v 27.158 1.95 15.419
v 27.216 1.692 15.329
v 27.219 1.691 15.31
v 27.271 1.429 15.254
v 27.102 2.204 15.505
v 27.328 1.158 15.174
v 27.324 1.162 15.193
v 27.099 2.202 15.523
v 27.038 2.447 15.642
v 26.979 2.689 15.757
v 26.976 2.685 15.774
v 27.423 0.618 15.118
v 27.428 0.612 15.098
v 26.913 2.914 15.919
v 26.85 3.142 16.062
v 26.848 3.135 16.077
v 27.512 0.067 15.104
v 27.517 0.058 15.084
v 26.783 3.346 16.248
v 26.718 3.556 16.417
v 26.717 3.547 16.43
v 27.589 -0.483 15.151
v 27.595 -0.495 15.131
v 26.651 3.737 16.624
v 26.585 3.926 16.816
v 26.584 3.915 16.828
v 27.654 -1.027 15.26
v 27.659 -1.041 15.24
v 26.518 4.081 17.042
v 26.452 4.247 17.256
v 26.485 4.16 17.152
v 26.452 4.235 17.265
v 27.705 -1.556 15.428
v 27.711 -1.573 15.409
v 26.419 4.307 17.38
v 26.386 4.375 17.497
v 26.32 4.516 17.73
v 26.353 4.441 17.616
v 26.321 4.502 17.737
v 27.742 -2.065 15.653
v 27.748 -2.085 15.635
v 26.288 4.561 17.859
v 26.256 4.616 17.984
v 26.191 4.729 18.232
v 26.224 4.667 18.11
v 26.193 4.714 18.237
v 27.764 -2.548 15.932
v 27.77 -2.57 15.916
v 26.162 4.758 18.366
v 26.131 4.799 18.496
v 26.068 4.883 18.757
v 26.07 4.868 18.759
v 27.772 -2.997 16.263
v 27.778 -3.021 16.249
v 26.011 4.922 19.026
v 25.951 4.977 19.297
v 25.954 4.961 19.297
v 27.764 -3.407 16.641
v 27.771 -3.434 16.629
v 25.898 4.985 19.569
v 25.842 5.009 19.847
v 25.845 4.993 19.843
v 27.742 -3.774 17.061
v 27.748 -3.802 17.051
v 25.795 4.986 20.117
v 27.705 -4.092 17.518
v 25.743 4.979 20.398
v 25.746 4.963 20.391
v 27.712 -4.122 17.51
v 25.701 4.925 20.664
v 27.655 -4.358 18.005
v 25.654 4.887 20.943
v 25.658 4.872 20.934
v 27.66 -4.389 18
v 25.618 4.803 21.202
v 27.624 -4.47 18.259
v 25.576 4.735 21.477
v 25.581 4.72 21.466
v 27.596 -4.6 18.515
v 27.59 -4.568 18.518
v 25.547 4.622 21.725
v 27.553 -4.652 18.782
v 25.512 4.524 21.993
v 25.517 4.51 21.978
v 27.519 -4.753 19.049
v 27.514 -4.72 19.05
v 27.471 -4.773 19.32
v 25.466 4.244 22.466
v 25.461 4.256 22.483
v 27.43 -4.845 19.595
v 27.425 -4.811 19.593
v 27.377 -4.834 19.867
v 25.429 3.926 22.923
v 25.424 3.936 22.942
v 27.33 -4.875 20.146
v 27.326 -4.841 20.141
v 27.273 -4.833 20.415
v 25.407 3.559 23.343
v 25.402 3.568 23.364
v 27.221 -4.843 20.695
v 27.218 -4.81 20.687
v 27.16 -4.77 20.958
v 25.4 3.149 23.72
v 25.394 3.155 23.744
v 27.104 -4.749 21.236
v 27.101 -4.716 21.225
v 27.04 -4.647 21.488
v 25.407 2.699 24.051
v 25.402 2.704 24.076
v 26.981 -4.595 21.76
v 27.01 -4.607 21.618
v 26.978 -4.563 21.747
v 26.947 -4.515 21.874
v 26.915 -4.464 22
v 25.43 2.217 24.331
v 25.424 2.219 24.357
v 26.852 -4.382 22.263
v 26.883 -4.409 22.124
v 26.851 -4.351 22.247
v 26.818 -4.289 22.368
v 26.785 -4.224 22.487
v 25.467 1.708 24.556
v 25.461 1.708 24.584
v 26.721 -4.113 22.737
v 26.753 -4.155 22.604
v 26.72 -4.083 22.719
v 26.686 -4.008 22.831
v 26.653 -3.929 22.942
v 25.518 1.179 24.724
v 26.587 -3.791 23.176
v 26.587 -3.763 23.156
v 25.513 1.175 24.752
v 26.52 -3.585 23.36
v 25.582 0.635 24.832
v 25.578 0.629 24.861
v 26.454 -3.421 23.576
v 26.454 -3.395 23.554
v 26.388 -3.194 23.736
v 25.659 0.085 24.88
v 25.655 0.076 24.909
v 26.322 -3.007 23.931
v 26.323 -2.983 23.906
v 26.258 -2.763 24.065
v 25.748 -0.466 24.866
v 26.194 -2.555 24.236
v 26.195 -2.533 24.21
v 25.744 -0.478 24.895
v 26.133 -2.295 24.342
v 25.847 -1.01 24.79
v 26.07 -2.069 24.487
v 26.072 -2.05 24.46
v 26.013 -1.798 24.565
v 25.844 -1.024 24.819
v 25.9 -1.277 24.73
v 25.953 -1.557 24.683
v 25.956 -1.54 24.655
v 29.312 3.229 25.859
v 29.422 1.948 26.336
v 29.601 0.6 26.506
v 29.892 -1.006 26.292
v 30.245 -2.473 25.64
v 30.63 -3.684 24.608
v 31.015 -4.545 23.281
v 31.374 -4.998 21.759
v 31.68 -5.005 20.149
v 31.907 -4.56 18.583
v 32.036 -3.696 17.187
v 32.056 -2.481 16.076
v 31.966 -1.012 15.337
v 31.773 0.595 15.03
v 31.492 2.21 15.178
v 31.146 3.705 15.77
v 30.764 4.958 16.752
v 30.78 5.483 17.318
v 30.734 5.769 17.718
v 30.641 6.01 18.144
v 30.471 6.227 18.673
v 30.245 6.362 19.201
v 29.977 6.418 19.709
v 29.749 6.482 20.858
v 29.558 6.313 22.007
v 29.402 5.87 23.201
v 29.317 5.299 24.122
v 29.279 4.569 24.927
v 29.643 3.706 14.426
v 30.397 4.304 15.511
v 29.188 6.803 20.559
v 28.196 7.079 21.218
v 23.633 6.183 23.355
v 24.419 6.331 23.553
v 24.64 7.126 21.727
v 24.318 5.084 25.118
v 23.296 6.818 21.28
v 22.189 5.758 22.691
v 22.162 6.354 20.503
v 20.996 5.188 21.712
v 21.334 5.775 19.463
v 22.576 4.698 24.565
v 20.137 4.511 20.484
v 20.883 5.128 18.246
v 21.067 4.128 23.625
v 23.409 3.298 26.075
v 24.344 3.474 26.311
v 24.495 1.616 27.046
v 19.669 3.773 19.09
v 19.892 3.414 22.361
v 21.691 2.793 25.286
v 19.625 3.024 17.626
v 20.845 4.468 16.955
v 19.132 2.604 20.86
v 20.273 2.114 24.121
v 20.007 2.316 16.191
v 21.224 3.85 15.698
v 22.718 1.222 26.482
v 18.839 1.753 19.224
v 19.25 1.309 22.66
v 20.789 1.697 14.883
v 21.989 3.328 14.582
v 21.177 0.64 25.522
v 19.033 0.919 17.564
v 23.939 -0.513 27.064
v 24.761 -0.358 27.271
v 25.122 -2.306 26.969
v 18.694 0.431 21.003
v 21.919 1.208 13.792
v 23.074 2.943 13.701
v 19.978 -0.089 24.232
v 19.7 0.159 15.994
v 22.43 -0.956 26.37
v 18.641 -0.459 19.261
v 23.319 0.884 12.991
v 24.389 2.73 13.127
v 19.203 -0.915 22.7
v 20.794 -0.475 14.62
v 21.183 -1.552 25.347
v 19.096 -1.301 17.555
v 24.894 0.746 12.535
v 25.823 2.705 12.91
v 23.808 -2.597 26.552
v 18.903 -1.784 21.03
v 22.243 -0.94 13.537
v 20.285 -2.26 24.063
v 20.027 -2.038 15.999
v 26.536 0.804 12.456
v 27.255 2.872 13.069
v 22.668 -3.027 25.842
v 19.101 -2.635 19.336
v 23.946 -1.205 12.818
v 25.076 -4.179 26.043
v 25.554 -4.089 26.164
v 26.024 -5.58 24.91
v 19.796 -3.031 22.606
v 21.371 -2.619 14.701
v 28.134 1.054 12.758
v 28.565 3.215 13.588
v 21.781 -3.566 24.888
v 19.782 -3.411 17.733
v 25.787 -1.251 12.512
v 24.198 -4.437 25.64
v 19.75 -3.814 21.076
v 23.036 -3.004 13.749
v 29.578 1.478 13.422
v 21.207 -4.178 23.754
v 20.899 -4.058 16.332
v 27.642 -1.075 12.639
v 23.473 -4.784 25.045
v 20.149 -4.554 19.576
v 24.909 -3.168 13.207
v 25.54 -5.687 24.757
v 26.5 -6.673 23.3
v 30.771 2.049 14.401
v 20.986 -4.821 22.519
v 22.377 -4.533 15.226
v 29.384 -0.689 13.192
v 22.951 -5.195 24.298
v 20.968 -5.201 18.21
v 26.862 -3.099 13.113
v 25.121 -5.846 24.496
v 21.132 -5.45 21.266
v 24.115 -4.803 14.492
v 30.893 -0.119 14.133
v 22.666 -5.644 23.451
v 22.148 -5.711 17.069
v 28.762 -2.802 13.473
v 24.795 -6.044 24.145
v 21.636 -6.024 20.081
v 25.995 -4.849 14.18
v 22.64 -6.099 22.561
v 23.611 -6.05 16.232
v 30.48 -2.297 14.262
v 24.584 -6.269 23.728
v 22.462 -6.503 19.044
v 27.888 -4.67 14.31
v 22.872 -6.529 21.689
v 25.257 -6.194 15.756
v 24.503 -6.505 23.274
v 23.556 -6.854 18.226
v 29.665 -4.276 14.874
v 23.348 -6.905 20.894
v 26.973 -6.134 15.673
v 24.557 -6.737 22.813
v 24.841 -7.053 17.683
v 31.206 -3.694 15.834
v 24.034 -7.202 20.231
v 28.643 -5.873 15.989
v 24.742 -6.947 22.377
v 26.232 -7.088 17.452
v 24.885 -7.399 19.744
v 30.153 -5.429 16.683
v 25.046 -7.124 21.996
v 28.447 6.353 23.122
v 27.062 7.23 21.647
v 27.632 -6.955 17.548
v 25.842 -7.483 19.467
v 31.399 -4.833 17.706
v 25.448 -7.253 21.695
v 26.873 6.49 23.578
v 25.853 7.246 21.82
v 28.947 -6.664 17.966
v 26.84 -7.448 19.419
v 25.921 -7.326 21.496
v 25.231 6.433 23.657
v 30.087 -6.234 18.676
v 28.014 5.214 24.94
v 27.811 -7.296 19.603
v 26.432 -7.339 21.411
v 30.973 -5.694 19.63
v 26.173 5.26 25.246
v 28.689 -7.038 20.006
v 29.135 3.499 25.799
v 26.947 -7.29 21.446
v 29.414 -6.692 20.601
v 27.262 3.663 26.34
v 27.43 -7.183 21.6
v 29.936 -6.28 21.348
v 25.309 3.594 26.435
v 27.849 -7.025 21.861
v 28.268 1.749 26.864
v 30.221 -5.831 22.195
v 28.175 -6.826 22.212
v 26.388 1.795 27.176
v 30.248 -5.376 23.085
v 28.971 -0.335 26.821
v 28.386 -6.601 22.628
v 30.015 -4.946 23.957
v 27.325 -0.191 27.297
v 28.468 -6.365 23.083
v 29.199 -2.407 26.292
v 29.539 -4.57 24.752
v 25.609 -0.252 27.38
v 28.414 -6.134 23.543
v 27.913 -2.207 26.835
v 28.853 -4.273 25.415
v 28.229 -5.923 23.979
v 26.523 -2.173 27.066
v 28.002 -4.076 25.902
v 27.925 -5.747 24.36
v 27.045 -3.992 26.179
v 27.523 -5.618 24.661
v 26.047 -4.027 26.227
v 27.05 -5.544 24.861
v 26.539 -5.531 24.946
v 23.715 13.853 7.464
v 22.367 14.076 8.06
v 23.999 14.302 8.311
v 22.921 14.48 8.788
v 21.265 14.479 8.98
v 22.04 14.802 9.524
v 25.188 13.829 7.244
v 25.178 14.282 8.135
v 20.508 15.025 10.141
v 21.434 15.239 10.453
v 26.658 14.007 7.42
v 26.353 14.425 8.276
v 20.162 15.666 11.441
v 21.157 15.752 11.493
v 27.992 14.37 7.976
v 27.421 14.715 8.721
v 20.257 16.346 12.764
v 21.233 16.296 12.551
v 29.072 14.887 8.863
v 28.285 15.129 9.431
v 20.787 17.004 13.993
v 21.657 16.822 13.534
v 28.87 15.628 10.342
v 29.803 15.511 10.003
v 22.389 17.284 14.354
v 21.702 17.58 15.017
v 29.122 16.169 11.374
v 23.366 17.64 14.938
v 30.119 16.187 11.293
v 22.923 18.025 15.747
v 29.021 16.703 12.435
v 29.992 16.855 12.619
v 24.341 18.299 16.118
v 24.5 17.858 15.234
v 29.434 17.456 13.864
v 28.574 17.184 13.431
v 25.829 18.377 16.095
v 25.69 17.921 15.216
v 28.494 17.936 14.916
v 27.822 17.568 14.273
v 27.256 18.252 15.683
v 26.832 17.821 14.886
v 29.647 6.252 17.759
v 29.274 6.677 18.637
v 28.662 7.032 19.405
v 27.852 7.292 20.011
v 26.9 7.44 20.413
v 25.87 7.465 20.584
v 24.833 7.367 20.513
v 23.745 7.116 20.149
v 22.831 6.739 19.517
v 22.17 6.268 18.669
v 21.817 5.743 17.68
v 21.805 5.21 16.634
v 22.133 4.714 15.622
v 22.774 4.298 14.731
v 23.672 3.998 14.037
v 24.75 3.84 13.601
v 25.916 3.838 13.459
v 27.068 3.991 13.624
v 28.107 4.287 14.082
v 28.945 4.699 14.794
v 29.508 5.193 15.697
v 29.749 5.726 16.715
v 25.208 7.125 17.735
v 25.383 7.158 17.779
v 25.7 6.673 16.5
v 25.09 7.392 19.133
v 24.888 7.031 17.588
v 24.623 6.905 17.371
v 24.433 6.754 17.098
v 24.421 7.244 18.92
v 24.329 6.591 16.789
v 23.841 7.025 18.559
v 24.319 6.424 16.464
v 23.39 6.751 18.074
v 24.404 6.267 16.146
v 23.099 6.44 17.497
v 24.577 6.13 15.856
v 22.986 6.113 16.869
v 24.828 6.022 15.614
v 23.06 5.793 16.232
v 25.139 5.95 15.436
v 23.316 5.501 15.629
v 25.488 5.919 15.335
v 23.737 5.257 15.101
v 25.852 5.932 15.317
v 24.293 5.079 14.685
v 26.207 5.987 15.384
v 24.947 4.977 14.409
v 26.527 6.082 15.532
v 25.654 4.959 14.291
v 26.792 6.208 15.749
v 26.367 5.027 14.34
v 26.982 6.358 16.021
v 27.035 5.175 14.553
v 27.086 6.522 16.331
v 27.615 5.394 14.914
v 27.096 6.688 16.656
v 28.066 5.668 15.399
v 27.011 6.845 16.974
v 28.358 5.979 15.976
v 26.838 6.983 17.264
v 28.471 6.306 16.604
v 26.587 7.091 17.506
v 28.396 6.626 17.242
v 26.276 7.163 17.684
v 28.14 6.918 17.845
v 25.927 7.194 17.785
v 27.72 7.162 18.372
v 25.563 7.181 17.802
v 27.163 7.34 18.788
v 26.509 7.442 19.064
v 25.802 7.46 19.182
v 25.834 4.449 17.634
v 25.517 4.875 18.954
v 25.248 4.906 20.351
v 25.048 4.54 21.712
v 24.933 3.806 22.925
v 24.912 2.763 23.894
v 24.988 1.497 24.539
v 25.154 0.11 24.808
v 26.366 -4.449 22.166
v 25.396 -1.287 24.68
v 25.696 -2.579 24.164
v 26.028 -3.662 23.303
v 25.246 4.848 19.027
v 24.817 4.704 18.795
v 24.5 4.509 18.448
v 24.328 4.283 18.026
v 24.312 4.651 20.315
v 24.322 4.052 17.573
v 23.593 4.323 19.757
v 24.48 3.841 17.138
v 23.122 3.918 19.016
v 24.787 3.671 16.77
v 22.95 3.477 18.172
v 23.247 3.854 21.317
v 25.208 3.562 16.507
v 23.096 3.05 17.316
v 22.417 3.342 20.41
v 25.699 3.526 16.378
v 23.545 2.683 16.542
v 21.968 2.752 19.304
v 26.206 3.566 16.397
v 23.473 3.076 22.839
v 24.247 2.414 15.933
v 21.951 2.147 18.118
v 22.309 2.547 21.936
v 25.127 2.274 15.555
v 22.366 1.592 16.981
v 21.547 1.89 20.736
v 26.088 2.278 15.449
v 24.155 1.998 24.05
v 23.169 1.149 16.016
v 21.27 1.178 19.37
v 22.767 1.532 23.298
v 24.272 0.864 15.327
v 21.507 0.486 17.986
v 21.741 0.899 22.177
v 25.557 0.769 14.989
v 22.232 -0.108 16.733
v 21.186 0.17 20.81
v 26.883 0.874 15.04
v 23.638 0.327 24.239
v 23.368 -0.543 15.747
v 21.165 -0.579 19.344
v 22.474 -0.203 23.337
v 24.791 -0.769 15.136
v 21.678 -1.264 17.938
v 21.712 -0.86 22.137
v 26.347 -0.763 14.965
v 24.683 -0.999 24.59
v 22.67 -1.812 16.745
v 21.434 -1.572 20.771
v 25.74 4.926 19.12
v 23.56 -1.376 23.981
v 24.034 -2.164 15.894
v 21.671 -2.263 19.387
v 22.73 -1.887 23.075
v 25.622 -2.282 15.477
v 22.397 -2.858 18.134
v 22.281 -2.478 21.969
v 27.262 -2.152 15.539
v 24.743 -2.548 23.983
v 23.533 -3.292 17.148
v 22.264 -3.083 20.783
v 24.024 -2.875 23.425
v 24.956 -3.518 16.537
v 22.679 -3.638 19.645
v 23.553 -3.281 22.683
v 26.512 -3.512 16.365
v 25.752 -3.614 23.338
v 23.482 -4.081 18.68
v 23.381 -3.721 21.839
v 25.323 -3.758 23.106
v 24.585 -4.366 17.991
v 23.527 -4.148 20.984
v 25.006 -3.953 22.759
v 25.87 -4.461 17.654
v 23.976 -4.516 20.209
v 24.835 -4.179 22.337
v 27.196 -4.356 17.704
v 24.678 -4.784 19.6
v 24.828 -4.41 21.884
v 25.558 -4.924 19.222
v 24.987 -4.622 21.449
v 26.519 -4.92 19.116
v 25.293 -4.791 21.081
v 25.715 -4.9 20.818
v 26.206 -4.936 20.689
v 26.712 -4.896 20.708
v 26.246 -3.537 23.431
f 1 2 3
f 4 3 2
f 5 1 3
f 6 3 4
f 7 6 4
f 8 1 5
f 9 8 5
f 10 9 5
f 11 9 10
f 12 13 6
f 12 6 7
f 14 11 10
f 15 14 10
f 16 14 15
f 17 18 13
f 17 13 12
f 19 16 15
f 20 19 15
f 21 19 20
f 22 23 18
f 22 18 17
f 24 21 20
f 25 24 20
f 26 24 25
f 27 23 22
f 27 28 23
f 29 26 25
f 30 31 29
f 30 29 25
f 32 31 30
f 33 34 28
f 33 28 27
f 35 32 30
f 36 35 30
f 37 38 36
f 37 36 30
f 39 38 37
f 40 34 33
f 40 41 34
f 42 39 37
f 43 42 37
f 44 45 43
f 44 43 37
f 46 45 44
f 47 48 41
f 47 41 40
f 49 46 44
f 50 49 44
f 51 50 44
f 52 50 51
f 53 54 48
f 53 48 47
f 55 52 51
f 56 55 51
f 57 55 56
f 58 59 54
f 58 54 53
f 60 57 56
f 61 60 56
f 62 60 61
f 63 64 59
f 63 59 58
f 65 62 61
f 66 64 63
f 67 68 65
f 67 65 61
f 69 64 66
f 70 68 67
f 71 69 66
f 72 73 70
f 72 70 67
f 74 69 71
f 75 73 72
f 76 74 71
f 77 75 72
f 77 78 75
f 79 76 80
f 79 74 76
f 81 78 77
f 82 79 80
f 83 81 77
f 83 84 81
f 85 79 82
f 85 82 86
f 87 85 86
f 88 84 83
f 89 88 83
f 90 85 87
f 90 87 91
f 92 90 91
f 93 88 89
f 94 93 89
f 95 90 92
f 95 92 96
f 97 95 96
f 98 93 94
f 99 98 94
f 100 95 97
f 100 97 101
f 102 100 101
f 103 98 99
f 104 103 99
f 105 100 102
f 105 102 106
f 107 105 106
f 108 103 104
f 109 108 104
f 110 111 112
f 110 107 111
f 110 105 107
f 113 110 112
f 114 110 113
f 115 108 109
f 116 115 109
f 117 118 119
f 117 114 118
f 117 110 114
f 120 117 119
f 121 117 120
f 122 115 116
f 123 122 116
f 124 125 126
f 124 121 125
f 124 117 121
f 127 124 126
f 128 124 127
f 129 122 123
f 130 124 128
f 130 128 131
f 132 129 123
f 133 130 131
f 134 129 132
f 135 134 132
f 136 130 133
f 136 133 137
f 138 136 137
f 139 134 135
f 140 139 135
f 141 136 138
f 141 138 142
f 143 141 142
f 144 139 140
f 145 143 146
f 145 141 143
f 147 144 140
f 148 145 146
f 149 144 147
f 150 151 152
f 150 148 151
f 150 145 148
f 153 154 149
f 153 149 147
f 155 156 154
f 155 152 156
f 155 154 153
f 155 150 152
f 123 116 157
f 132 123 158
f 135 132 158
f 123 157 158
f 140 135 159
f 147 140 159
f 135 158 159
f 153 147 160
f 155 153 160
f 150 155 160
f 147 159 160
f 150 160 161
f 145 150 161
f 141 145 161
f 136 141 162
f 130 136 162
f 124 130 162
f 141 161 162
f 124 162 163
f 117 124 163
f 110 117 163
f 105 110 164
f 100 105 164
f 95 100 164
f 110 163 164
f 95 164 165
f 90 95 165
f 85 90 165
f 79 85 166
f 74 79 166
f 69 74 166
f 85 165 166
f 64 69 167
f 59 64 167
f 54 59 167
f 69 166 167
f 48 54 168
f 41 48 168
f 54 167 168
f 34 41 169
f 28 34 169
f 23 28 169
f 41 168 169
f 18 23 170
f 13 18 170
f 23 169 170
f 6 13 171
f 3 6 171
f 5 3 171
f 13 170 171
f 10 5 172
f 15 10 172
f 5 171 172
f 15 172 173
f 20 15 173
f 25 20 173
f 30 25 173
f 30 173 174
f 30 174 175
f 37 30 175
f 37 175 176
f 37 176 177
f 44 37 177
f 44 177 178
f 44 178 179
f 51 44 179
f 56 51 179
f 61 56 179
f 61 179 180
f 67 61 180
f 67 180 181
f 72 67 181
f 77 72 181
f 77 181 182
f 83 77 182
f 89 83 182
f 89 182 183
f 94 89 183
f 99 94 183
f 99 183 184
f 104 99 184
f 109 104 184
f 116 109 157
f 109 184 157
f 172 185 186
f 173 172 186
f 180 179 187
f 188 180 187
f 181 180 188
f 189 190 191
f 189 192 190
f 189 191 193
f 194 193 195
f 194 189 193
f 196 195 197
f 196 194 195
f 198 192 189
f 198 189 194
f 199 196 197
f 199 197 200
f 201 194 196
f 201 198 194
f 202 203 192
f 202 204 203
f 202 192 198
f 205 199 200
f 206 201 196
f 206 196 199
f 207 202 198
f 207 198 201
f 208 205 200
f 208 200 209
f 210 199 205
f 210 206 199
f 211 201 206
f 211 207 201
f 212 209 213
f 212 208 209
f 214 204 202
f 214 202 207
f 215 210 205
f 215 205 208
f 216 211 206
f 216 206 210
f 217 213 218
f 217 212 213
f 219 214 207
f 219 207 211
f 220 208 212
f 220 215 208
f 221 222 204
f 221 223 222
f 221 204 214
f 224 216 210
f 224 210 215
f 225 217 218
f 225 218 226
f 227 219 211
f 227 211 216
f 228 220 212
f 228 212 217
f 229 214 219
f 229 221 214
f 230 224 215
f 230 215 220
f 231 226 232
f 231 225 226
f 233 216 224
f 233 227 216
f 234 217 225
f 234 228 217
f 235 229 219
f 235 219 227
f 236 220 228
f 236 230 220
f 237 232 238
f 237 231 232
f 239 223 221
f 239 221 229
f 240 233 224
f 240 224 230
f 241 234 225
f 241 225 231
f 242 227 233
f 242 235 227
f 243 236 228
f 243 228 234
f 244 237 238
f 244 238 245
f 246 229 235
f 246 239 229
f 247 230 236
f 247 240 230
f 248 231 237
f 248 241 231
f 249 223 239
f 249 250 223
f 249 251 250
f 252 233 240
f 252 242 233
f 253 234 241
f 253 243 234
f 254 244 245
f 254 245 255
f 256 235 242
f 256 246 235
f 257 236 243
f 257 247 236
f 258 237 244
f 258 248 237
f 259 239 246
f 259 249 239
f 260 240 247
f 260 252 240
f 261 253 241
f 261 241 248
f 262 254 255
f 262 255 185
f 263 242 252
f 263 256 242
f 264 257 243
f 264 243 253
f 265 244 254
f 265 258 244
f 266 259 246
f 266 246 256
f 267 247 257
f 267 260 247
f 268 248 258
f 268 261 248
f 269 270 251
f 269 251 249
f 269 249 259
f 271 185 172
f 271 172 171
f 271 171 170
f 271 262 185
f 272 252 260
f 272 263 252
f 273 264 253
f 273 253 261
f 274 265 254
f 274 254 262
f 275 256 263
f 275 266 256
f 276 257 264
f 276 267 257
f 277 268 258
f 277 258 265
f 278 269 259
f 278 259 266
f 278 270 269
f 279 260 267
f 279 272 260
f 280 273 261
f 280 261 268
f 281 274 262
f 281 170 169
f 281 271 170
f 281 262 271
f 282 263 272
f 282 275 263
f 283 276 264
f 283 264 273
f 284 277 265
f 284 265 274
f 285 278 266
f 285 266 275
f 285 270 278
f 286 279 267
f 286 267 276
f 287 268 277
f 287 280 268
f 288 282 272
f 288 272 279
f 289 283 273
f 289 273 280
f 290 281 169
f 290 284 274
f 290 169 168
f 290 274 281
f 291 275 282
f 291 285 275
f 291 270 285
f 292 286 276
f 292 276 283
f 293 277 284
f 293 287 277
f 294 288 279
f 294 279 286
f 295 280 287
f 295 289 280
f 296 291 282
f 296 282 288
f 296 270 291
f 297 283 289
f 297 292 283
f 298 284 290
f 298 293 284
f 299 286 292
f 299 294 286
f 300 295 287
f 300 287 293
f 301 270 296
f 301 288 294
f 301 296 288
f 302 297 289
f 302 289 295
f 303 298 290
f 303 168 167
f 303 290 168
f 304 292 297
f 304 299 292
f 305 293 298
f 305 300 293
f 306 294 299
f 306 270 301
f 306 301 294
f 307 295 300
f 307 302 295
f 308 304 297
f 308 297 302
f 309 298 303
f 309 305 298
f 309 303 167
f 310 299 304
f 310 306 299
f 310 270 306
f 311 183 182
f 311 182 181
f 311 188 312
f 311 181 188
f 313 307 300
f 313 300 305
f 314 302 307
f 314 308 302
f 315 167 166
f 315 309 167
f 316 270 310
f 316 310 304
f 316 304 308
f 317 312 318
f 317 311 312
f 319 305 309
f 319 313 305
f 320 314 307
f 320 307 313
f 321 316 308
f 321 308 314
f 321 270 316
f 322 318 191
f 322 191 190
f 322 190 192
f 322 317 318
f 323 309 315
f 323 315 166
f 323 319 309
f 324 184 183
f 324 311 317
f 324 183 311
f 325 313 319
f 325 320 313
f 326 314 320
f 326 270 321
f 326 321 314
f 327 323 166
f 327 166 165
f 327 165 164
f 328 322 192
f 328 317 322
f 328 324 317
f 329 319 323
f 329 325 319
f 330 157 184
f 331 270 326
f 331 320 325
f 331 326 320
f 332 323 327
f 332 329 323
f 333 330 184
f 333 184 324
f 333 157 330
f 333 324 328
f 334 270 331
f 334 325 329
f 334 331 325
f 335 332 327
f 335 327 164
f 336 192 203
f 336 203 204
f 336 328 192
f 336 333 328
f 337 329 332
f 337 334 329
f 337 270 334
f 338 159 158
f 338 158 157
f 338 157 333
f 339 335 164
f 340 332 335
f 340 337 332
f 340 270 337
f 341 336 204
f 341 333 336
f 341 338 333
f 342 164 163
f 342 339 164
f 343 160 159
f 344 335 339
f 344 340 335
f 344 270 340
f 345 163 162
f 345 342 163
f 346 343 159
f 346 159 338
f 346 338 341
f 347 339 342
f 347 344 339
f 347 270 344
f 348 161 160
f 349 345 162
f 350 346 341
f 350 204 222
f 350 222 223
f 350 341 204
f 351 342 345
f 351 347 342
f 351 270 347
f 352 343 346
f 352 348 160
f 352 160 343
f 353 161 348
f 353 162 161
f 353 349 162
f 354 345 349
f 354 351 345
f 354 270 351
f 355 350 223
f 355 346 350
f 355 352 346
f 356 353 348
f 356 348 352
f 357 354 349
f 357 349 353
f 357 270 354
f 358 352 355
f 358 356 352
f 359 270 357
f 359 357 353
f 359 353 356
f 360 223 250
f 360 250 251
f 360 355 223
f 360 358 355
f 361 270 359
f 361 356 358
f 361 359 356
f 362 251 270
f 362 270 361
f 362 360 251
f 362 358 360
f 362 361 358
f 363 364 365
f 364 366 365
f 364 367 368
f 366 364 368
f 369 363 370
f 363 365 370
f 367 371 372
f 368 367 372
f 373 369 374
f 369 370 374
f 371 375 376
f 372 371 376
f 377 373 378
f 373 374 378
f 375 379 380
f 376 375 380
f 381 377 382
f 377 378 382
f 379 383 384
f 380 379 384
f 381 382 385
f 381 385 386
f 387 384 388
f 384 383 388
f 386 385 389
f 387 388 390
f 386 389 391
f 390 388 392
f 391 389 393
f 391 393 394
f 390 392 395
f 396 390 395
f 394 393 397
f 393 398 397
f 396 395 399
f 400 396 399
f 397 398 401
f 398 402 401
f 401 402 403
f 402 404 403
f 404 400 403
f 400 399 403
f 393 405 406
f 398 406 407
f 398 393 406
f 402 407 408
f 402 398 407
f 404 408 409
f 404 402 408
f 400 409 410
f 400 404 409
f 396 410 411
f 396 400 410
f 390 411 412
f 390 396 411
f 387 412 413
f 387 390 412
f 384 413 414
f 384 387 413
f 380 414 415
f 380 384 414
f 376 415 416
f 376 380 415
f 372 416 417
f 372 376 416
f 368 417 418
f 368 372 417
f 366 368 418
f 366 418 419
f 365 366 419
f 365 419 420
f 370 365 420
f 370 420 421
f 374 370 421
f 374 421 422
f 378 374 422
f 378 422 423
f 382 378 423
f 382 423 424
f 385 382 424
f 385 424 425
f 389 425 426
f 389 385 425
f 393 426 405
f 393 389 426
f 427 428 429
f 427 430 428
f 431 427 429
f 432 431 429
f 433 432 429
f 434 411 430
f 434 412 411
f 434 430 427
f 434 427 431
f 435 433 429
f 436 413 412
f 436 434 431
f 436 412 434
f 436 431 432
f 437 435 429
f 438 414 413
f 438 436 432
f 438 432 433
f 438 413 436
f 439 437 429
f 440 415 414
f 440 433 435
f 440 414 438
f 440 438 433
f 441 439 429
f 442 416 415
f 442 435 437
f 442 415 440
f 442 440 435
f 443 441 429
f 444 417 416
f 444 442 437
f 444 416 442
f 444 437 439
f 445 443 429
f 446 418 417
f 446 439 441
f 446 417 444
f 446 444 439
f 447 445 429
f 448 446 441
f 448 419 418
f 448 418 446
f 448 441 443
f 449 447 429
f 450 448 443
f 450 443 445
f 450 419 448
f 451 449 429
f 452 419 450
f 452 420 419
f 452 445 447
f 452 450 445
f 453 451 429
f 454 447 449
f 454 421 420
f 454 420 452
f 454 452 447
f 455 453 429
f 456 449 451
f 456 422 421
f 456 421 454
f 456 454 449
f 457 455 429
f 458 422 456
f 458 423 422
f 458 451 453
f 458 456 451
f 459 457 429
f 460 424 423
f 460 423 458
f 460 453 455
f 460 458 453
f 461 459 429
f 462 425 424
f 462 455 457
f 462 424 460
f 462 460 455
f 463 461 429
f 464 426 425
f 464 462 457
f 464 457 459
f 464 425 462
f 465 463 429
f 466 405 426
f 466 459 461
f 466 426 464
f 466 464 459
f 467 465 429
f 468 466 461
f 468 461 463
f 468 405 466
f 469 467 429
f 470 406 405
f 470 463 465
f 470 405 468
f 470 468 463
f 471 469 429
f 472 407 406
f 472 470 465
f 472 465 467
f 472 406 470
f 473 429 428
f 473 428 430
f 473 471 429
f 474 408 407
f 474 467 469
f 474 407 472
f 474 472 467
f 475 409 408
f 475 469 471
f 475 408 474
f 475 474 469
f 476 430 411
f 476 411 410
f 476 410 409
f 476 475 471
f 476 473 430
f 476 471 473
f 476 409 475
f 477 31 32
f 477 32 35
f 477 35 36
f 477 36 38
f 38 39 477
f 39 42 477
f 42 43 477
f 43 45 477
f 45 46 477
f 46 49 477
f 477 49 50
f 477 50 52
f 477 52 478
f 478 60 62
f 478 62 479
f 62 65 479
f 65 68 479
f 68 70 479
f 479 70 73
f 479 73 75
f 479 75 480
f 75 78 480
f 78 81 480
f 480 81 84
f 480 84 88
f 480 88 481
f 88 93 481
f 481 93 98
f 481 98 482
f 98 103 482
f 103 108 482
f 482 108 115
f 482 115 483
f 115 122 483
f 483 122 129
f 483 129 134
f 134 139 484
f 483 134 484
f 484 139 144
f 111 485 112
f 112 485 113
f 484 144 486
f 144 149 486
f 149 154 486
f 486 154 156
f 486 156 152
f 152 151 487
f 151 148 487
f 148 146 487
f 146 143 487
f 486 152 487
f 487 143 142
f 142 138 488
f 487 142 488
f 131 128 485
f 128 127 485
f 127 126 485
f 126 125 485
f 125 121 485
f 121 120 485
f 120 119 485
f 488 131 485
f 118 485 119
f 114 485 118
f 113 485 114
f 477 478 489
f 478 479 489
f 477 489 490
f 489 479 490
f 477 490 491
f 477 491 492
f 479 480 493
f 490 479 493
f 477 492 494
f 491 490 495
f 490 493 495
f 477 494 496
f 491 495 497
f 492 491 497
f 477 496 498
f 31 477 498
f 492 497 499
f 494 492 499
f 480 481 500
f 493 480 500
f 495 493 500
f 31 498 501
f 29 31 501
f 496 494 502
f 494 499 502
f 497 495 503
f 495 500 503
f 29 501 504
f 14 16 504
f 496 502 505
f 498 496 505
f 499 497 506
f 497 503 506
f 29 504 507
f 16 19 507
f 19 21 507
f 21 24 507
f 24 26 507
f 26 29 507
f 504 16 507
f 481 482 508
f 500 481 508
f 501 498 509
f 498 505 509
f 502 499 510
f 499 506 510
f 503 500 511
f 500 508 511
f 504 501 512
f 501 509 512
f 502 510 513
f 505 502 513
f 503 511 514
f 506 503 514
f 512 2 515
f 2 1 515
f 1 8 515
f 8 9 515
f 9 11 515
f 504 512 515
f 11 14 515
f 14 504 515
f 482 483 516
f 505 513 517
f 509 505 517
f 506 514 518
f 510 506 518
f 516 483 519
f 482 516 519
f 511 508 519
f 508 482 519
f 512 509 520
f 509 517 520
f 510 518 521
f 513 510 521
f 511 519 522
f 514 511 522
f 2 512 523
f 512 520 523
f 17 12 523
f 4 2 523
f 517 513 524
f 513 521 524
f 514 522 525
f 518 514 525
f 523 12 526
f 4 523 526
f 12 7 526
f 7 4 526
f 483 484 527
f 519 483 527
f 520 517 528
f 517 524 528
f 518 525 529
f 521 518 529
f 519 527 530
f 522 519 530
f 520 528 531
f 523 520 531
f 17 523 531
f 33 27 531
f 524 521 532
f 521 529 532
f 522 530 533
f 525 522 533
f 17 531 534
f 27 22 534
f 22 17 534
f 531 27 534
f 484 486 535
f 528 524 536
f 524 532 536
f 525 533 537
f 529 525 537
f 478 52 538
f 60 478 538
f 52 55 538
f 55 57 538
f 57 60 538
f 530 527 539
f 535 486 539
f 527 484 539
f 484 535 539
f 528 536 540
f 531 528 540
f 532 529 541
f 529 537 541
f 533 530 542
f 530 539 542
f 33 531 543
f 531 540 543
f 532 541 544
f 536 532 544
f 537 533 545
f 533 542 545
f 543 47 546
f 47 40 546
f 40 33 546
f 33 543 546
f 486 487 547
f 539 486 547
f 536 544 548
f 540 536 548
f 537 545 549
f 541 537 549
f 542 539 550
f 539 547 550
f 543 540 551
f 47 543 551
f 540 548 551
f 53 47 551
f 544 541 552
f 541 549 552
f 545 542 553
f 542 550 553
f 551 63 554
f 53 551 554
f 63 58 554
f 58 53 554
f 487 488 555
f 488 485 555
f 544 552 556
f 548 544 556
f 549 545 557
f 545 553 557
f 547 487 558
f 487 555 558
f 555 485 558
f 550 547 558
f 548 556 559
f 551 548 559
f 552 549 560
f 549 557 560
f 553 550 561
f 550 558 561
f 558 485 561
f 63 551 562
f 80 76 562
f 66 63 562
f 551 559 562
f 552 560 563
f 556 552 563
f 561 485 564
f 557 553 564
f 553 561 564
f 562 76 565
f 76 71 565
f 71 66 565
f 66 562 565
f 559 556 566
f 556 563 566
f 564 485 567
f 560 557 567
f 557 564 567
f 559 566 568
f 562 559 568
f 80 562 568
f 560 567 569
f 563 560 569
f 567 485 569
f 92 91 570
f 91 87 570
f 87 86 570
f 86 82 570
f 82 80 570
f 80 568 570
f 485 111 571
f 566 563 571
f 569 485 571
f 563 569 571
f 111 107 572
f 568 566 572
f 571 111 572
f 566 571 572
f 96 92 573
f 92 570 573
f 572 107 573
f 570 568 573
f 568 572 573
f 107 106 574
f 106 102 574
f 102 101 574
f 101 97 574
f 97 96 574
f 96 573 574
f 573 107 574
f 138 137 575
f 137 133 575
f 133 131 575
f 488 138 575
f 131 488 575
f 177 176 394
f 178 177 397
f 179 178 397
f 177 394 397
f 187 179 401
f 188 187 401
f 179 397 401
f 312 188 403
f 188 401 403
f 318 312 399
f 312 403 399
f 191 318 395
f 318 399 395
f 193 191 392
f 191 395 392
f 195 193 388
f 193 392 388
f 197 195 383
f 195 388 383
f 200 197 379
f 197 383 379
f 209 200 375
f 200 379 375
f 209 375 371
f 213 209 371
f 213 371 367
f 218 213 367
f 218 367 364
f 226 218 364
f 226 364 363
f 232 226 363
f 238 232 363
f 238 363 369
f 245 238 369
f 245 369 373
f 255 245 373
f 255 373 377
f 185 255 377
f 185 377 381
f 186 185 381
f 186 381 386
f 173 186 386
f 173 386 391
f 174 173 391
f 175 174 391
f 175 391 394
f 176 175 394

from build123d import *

# Parameters (mm, degrees)
SKETCH004_R             = 5
SKETCH004_R_2           = 4
PAD002_DEPTH            = 12.5
SKETCH006_R             = 5
SKETCH007_R             = 6.5
BODY001_ROLL_ANGLE      = 62.539133
BODY001_PITCH_ANGLE     = -10.591695
BODY001_PLACEMENT_ANGLE = 8.882862


with BuildPart() as part:
    # Sketch004 → Pad002 (new body)
    with BuildSketch(Plane.XY):
        Circle(SKETCH004_R)
        Circle(SKETCH004_R_2, mode=Mode.SUBTRACT)
    extrude(amount=PAD002_DEPTH)

    # Sketch005 → Revolution002 (revolve)
    with BuildSketch(Plane.YZ):
        with BuildLine():
            ThreePointArc((0, 10.59017), (7.5, 18.09017), (0, 25.59017))
            Line((0, 25.59017), (0, 23.09017))
            ThreePointArc((0, 13.09017), (5, 18.09017), (0, 23.09017))
            Line((0, 13.09017), (0, 10.59017))
        make_face()
    revolve(axis=Axis((0, 0, 0), (0, 0, 1)))

    # Sketch006 (on DatumPlane) → SubtractiveLoft section 0
    with BuildSketch(Plane.YZ.offset(0.5)):
        with Locations((0, 18.1)):
            Circle(SKETCH006_R)
    # Sketch007 (on DatumPlane) → SubtractiveLoft section 1
    with BuildSketch(Plane.YZ.offset(8)):
        with Locations((0, 18.081013)):
            Circle(SKETCH007_R)
    loft(mode=Mode.SUBTRACT)


with BuildPart() as part_1:
    # Body001 roll: moved
    add(part.part.rotate(Axis((0, 0, 0), (1, 0, 0)), BODY001_ROLL_ANGLE))


with BuildPart() as part_2:
    # Body001 pitch: moved
    add(part_1.part.rotate(Axis((0, 0, 0), (0, 1, 0)), BODY001_PITCH_ANGLE))


with BuildPart() as part_3:
    # Body001 placement: moved
    add(part_2.part.moved(Location((25.136332, 16.096128, 11.699976))).rotate(Axis((25.136332, 16.096128, 11.699976), (0, 0, 1)), BODY001_PLACEMENT_ANGLE))


solid = part_3.part
